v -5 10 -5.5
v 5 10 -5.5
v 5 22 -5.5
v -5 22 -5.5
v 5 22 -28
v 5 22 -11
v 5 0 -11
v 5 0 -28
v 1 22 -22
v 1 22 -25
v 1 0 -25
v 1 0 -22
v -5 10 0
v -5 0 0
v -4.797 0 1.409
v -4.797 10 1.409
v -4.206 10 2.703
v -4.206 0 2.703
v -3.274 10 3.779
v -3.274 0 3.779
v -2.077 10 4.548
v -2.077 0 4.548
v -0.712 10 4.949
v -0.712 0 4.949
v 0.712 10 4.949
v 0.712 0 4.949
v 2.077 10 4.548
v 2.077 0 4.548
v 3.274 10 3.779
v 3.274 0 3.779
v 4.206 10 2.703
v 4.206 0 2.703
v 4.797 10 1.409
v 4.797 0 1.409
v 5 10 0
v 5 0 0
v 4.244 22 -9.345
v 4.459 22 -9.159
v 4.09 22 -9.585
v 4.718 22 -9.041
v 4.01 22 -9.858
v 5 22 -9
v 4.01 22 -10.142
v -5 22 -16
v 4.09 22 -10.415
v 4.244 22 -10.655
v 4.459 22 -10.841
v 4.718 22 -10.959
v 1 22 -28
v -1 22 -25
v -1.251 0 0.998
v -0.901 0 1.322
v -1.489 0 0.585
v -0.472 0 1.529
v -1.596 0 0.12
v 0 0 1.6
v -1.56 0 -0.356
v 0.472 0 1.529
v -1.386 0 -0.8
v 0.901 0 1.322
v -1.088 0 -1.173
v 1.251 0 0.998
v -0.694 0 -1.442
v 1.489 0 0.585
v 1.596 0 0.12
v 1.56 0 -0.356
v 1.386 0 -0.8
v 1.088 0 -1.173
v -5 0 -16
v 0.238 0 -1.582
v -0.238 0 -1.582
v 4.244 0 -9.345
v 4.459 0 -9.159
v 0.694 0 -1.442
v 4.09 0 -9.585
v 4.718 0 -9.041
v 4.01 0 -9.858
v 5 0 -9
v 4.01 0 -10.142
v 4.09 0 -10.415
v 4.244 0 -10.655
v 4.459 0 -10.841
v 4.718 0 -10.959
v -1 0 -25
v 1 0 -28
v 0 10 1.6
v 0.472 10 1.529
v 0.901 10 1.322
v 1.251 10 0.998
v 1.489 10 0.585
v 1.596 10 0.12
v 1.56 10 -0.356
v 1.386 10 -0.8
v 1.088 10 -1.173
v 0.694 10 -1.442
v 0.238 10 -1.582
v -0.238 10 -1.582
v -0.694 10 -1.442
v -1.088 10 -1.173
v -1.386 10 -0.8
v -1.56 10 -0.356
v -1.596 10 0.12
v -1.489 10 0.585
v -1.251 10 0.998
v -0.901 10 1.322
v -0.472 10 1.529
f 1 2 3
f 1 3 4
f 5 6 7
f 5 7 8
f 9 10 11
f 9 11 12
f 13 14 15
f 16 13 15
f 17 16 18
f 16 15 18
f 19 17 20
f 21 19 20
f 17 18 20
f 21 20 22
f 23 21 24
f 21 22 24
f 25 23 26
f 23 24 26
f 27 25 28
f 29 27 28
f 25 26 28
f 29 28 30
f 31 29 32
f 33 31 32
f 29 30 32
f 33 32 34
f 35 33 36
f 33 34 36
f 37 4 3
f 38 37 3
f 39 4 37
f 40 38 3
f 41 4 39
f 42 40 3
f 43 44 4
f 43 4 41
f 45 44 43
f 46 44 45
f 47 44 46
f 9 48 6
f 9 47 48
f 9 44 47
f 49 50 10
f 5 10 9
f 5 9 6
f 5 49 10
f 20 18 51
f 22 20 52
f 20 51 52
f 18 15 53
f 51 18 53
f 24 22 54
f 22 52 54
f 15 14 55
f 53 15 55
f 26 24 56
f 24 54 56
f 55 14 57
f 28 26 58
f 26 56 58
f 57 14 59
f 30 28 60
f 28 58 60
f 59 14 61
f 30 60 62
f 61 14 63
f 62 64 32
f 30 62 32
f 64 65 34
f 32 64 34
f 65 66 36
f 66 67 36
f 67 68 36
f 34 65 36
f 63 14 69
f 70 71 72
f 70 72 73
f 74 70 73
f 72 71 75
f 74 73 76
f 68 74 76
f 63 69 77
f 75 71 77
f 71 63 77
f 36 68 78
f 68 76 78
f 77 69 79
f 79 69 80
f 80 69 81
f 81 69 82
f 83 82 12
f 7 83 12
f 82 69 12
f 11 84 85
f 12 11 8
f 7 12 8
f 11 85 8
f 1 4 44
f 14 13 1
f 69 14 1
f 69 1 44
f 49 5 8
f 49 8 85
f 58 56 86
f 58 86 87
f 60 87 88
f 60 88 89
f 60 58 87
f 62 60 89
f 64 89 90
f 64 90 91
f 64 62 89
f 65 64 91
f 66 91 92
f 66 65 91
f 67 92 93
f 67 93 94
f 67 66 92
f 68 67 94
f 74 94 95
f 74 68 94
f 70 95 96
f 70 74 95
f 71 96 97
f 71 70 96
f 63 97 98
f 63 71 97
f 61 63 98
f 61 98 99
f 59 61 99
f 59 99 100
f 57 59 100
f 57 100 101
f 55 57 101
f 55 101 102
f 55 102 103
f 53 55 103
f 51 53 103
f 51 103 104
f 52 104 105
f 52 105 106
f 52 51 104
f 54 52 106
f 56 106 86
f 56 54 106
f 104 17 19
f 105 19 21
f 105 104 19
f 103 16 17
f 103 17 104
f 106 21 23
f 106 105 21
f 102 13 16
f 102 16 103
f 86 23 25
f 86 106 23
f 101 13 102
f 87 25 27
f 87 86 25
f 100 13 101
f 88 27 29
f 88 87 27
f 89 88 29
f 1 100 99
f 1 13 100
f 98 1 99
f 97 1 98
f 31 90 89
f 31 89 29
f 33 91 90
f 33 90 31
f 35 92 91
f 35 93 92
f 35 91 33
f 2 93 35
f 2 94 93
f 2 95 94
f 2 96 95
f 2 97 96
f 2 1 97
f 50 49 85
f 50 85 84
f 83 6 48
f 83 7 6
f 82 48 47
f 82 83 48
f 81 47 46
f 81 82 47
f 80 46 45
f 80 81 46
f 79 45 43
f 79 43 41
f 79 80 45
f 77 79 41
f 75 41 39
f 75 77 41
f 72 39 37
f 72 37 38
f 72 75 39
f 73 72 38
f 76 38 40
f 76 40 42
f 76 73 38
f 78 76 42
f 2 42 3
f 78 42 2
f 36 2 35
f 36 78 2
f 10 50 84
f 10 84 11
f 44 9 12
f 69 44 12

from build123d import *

# Parameters (mm, degrees)
SKETCH1_R           = 1.6
BOSS_EXTRUDE1_DEPTH = 10
BOSS_EXTRUDE2_DEPTH = 12
BOSS_EXTRUDE3_DEPTH = 22
CHAMFER1_SIZE       = 6


with BuildPart() as part:
    # Sketch1 → Boss-Extrude1 (new body)
    with BuildSketch(Plane(origin=(0, 0, 0), x_dir=(1, 0, 0), z_dir=(0, 1, 0))):
        with BuildLine():
            Line((-5, 22), (-5, 0))
            ThreePointArc((-5, 0), (0, -5), (5, 0))
            Line((5, 0), (5, 9))
            ThreePointArc((5, 9), (4, 10), (5, 11))
            Line((5, 11), (5, 22))
            Line((5, 22), (-5, 22))
        make_face()
        with Locations(Location((0, 0, 0), (0, 0, 270))):
            Circle(SKETCH1_R, mode=Mode.SUBTRACT)
    extrude(amount=BOSS_EXTRUDE1_DEPTH)

    # Sketch3 → Boss-Extrude2 (add)
    with BuildSketch(Plane(origin=(0, 10, 0), x_dir=(1, 0, 0), z_dir=(0, 1, 0))):
        with BuildLine():
            Line((5, 5.5), (-5, 5.5))
            Line((-5, 5.5), (-5, 22))
            Line((-5, 22), (5, 22))
            Line((5, 22), (5, 11))
            ThreePointArc((5, 11), (4, 10), (5, 9))
            Line((5, 9), (5, 5.5))
        make_face()
    extrude(amount=BOSS_EXTRUDE2_DEPTH)

    # Sketch5 → Boss-Extrude3 (add)
    with BuildSketch(Plane(origin=(0, 22, 0), x_dir=(1, 0, 0), z_dir=(0, 1, 0))):
        Polygon((5, 22), (5, 28), (1, 28), (-1, 25), (1, 25), (1, 22), align=None)
    extrude(amount=-BOSS_EXTRUDE3_DEPTH)

    # Chamfer1
    chamfer1_edges = [part.edges().sort_by_distance(p)[0] for p in [
        (-5, 11, -22),
    ]]
    chamfer(chamfer1_edges, length=CHAMFER1_SIZE - 0.0001)  # a hair under: the kernel refuses the full size


solid = part.part
